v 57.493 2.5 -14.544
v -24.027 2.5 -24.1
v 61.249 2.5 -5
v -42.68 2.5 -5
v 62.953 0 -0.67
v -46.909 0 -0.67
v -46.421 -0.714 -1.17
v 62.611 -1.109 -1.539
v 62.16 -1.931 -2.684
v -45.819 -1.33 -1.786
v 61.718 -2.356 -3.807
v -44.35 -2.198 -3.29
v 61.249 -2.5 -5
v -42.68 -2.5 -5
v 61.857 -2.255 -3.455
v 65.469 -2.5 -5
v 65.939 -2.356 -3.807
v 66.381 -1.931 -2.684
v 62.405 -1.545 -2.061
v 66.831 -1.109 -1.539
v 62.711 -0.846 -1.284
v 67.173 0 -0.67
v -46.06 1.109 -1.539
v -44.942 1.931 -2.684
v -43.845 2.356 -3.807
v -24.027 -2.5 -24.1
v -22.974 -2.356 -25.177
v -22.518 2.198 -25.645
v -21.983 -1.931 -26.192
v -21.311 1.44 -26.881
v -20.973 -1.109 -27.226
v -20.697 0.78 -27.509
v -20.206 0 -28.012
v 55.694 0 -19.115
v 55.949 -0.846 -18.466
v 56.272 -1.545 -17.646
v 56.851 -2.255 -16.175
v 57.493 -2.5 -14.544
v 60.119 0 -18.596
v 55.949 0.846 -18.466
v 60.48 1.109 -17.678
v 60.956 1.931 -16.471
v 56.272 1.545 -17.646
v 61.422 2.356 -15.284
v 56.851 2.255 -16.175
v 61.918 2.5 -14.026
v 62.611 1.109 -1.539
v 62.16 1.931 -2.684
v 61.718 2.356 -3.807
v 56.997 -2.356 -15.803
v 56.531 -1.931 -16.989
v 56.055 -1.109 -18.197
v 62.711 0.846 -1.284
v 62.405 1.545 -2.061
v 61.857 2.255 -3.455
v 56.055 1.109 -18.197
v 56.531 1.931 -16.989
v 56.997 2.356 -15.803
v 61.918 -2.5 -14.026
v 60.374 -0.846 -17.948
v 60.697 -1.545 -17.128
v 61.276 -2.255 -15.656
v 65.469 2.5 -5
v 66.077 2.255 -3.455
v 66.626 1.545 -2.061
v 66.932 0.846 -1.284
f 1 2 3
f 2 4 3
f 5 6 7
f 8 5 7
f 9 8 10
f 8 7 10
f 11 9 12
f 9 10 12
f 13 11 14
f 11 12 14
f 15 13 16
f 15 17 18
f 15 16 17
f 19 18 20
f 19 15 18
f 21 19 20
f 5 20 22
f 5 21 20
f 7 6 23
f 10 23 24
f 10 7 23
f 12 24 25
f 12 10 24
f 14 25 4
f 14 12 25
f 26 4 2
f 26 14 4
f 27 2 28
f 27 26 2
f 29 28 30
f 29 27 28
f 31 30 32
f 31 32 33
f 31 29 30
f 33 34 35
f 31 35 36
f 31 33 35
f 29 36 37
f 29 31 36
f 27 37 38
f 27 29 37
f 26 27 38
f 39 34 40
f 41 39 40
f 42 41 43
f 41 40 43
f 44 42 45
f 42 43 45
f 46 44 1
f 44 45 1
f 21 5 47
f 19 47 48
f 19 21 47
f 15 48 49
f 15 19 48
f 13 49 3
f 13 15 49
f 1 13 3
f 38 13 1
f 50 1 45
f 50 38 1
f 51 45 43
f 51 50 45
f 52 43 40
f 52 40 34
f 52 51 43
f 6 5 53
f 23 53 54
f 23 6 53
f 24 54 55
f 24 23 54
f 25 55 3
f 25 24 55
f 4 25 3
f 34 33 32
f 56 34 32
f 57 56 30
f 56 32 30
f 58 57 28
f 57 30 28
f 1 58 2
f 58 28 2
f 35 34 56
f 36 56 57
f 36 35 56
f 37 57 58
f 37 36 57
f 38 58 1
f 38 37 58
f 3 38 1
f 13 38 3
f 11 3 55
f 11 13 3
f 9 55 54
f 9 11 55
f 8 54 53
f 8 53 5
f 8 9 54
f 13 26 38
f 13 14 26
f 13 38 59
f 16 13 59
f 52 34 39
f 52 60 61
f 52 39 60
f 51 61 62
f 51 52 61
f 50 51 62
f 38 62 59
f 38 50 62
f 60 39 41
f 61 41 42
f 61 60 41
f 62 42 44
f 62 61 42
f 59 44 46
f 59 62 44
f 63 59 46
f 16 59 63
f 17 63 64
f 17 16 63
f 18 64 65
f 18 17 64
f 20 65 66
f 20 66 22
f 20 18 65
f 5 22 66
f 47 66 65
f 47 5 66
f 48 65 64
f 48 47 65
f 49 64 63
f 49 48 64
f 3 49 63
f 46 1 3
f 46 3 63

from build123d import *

# Parameters (mm, degrees)
F1_DEPTH    = 2.5
F2_T1_DEPTH = 135.7792679391
F2_T3_DEPTH = 100.5448710702
F3_DEPTH    = 2.5
F4_T1_DEPTH = 29.2207320609
F4_T3_DEPTH = 29.4551289298


# Not quite as in the source:
# - a fillet or chamfer that OpenCascade refuses, or shapes differently, is made with other operations: its cross-section is extruded or revolved along the edge and cut away or added


with BuildPart() as f1:
    # F0 (on Front) → F1 (new body, symmetric)
    with BuildSketch(Plane.XZ):
        Polygon((63.2162865844, 0), (-47.5629813547, 0), (-19.6151699151, -28.6167754252), (55.4160096247, -19.8219109079), align=None)
    extrude(amount=F1_DEPTH, both=True)

    # F2: fillet of radius 5 on 4 edges, made by hand

    # F2_s2 → F2_t1 (cut)
    with BuildSketch(Plane.YZ.offset(-60.0629813547)):
        with BuildLine():
            ThreePointArc((2.5, 0), (-1.0355339059, -1.4644660941), (-2.5, -5))
            Line((-2.5, -5), (-2.5, 0))
            Line((-2.5, 0), (2.5, 0))
        make_face()
        with BuildLine():
            ThreePointArc((-2.5, 0), (1.0355339059, -1.4644660941), (2.5, -5))
            Line((2.5, -5), (2.5, 0))
            Line((2.5, 0), (-2.5, 0))
        make_face()
    extrude(amount=F2_T1_DEPTH, mode=Mode.SUBTRACT)

    # F2_s4 → F2_t3 (cut)
    with BuildSketch(Plane(origin=(-35.073204722, 0, -4.1111453346), x_dir=(0, 1, 0), z_dir=(0.9932001799, 0, 0.1164190817))):
        with BuildLine():
            ThreePointArc((2.5, -26.1386064324), (-1.0355339059, -24.6741403384), (-2.5, -21.1386064324))
            Line((-2.5, -21.1386064324), (-2.5, -26.1386064324))
            Line((-2.5, -26.1386064324), (2.5, -26.1386064324))
        make_face()
        with BuildLine():
            ThreePointArc((-2.5, -26.1386064324), (1.0355339059, -24.6741403384), (2.5, -21.1386064324))
            Line((2.5, -21.1386064324), (2.5, -26.1386064324))
            Line((2.5, -26.1386064324), (-2.5, -26.1386064324))
        make_face()
    extrude(amount=F2_T3_DEPTH, mode=Mode.SUBTRACT)


with BuildPart() as f3:
    # F0 (on Front) → F3 (new body, symmetric)
    with BuildSketch(Plane.XZ):
        Polygon((67.4370186453, 0), (63.2162865844, 0), (55.4160096247, -19.8219109079), (59.8408444794, -19.3032488891), align=None)
    extrude(amount=F3_DEPTH, both=True)

    # F4: fillet of radius 5 on 4 edges, made by hand

    # F4_s2 → F4_t1 (cut)
    with BuildSketch(Plane.YZ.offset(50.7162865844)):
        with BuildLine():
            ThreePointArc((-2.5, -5), (-1.0355339059, -1.4644660941), (2.5, 0))
            Line((2.5, 0), (-2.5, 0))
            Line((-2.5, 0), (-2.5, -5))
        make_face()
        with BuildLine():
            ThreePointArc((-2.5, 0), (1.0355339059, -1.4644660941), (2.5, -5))
            Line((2.5, -5), (2.5, 0))
            Line((2.5, 0), (-2.5, 0))
        make_face()
    extrude(amount=F4_T1_DEPTH, mode=Mode.SUBTRACT)

    # F4_s4 → F4_t3 (cut)
    with BuildSketch(Plane(origin=(39.9579748177, 0, 4.6837191826), x_dir=(0, 1, 0), z_dir=(0.9932001799, 0, 0.1164190817))):
        with BuildLine():
            ThreePointArc((2.5, -26.1386064324), (-1.0355339059, -24.6741403384), (-2.5, -21.1386064324))
            Line((-2.5, -21.1386064324), (-2.5, -26.1386064324))
            Line((-2.5, -26.1386064324), (2.5, -26.1386064324))
        make_face()
        with BuildLine():
            ThreePointArc((-2.5, -26.1386064324), (1.0355339059, -24.6741403384), (2.5, -21.1386064324))
            Line((2.5, -21.1386064324), (2.5, -26.1386064324))
            Line((2.5, -26.1386064324), (-2.5, -26.1386064324))
        make_face()
    extrude(amount=F4_T3_DEPTH, mode=Mode.SUBTRACT)


solid = Compound([f1.part, f3.part])
